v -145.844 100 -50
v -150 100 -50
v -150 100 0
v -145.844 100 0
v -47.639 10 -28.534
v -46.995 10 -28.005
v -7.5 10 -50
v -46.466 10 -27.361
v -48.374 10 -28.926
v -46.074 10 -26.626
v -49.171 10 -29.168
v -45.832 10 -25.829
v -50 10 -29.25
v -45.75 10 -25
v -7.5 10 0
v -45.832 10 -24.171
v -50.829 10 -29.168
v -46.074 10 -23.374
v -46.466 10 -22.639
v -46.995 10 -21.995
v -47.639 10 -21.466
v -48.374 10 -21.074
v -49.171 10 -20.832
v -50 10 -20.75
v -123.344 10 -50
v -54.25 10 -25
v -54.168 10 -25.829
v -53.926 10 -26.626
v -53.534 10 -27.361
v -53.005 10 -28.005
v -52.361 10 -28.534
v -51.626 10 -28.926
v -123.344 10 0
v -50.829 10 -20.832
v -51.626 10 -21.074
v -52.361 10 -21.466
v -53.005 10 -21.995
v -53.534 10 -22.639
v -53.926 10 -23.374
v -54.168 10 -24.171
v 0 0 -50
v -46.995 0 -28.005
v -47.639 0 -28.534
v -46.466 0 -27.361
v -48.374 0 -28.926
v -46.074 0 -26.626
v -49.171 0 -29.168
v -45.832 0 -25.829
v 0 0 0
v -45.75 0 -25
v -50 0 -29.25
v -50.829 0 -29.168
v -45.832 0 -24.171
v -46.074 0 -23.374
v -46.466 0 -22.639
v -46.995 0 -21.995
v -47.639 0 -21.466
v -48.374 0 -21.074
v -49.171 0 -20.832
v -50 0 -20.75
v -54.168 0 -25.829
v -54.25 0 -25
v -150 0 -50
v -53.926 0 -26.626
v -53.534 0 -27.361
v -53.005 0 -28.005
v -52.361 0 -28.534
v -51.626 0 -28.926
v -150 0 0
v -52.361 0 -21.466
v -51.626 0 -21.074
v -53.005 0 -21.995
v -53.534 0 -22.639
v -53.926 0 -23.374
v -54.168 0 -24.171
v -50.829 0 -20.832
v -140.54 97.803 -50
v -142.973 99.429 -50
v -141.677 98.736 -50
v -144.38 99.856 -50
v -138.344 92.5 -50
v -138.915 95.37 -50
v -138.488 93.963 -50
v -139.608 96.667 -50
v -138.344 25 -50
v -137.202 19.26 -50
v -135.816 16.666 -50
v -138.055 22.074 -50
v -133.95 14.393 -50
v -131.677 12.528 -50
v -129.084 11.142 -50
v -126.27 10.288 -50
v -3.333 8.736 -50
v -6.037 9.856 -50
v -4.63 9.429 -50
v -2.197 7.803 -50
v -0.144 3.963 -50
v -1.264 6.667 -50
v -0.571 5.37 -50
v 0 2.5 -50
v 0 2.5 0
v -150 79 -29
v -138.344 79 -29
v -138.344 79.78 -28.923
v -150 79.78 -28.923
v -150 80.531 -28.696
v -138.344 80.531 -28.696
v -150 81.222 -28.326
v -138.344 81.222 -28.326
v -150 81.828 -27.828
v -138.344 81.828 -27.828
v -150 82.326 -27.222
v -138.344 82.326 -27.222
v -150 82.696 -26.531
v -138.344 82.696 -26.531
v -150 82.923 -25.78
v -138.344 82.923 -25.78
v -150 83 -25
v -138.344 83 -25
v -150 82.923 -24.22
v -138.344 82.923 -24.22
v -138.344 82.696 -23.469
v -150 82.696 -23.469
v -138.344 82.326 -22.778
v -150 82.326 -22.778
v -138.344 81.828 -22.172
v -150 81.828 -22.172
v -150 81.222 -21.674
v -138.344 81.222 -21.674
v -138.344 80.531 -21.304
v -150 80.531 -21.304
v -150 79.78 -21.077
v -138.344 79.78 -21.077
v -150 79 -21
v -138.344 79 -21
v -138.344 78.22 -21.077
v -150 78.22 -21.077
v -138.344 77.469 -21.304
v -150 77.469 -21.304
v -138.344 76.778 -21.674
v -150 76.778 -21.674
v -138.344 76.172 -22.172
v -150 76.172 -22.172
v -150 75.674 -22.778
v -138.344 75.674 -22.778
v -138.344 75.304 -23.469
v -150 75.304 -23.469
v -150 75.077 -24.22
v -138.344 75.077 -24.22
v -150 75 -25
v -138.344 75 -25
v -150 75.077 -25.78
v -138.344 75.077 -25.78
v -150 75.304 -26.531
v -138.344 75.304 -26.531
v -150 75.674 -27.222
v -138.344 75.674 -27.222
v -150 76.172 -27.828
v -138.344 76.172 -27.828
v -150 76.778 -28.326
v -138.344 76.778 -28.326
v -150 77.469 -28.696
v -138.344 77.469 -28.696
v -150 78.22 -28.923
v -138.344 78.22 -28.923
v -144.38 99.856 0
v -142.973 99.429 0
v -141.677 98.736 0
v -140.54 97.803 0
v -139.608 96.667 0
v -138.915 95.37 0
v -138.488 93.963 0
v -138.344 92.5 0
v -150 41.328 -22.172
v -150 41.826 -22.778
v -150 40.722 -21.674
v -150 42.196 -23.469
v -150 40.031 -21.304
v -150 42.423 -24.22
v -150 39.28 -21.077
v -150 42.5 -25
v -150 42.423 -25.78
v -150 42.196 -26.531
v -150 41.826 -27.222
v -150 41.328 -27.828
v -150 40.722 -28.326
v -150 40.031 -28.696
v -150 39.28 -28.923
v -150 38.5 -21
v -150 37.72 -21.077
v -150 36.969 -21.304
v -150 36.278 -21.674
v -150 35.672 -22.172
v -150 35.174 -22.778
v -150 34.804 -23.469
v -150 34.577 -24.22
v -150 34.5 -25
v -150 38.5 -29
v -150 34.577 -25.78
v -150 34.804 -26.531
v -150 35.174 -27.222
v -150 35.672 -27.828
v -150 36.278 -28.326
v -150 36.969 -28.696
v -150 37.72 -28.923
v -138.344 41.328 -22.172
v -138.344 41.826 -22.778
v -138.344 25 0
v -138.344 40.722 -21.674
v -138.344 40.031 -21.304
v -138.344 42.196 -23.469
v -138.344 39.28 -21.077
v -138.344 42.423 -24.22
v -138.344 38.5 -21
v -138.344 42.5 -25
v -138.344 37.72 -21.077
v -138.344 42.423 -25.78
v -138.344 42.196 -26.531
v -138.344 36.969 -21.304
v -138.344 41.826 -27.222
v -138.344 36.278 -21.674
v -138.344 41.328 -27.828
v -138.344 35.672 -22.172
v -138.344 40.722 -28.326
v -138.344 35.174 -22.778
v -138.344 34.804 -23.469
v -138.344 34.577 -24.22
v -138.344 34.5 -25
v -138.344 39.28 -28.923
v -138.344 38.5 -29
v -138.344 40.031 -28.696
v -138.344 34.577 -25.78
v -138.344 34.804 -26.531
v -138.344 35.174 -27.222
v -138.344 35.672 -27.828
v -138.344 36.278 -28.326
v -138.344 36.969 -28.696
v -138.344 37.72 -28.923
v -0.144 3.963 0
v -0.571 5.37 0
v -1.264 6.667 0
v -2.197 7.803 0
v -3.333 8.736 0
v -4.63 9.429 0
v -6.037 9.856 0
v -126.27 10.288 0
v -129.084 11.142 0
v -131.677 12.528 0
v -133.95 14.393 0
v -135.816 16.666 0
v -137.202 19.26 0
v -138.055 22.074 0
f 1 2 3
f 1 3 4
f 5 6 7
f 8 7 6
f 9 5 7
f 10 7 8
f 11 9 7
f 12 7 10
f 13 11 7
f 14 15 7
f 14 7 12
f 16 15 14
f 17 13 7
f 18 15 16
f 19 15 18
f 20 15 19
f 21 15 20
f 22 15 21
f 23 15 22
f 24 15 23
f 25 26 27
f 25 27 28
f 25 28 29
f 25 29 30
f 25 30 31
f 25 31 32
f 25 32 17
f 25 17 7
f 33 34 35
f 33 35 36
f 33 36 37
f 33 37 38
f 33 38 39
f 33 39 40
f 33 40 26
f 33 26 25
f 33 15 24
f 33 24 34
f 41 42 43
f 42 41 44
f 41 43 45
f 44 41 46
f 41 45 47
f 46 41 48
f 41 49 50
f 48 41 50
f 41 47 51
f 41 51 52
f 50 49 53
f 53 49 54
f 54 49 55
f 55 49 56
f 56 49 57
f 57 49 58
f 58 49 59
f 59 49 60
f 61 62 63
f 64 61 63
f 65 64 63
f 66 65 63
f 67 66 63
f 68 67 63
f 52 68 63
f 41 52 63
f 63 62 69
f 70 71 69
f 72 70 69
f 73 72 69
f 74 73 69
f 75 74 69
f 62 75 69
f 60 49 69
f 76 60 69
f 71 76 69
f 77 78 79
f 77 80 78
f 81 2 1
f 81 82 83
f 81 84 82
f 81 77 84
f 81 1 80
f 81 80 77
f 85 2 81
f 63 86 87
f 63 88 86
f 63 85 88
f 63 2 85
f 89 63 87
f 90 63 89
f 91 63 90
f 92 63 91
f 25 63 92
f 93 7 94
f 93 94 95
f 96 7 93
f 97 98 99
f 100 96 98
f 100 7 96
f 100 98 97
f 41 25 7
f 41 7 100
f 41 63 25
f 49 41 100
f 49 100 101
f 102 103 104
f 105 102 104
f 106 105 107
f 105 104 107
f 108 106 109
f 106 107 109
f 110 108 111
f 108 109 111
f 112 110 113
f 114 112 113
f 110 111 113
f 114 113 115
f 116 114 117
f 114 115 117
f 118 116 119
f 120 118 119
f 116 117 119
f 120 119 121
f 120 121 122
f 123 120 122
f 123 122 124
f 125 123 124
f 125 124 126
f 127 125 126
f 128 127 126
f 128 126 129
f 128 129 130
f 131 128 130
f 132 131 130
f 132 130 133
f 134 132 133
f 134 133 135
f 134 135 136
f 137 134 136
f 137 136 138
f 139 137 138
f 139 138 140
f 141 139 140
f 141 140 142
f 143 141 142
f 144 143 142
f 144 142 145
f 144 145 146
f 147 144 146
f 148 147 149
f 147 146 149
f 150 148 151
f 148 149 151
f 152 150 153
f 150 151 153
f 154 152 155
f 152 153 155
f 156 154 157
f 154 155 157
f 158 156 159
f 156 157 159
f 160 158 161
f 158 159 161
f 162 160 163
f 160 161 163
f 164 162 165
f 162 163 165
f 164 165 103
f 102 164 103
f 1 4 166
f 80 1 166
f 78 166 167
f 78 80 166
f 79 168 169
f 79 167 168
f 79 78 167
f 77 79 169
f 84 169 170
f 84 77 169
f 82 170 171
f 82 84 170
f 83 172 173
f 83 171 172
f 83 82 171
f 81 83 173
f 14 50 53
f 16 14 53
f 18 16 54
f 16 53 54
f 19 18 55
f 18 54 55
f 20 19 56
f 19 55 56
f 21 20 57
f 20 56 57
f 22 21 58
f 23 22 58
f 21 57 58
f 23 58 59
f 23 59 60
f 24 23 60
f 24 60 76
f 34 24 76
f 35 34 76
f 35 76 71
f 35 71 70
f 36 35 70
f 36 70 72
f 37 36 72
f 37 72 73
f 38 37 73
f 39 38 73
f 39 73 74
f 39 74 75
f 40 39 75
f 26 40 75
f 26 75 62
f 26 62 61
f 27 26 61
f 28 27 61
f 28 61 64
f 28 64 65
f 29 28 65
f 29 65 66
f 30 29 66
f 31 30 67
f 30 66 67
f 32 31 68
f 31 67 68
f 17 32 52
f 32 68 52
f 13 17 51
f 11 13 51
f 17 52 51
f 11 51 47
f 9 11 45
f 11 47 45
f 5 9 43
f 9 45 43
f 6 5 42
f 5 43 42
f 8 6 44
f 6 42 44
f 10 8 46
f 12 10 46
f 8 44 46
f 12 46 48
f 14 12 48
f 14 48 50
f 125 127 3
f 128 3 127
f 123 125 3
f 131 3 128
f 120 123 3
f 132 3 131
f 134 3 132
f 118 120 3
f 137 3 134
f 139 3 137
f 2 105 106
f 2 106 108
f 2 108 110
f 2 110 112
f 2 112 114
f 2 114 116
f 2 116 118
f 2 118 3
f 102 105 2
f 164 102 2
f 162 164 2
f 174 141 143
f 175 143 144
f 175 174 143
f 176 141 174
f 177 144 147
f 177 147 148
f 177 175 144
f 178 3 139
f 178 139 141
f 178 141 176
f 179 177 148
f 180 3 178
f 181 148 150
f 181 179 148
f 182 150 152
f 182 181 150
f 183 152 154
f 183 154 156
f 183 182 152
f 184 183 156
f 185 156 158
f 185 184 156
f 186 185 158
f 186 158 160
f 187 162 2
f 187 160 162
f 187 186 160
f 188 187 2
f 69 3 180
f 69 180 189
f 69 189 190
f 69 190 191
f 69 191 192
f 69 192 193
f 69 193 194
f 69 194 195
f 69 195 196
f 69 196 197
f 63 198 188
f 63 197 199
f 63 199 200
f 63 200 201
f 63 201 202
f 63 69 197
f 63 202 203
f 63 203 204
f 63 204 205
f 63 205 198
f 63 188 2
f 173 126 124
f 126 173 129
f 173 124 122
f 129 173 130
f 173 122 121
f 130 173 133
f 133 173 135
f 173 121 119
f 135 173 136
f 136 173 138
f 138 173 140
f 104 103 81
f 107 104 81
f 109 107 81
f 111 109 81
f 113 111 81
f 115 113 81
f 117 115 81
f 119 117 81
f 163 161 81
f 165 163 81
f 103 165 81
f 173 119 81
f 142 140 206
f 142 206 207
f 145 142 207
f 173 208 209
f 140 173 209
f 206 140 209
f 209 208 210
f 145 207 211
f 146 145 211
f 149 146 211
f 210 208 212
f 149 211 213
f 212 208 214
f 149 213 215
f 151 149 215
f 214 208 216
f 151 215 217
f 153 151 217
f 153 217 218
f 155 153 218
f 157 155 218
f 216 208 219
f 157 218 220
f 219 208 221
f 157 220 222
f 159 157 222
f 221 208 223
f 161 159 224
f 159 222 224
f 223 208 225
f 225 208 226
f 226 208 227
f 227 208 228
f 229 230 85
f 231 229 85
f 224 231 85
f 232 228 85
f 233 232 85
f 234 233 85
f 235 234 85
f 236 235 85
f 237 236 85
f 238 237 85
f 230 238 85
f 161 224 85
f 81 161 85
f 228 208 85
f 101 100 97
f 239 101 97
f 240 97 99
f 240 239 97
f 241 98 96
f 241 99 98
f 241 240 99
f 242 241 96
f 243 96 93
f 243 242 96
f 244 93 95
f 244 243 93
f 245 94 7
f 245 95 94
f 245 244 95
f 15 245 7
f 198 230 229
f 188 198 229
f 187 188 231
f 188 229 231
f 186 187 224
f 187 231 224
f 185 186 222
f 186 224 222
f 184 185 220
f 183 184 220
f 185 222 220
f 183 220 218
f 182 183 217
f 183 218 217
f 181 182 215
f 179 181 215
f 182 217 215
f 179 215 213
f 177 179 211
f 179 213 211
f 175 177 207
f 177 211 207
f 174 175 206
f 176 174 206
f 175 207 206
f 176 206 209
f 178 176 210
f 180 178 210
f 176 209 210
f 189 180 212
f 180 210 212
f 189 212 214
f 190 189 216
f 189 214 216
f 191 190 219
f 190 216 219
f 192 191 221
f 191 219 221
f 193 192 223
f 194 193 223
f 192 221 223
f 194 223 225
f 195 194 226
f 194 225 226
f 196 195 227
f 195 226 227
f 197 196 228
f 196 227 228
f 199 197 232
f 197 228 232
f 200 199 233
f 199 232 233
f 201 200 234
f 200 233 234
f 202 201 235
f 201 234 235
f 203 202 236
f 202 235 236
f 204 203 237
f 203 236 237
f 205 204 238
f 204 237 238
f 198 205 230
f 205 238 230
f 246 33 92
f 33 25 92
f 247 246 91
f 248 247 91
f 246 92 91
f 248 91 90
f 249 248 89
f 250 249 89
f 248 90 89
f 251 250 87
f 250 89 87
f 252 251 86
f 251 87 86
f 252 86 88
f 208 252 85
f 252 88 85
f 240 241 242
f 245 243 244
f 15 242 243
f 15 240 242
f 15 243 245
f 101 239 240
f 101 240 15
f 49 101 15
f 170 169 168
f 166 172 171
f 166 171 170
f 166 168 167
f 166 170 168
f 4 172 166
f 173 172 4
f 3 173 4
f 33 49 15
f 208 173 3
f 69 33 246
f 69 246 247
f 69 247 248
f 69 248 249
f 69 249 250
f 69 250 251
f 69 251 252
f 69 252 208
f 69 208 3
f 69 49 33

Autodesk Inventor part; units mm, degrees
ref_plane "YZ Plane" through (0, 0, 0) normal (1, 0, 0) x (0, 1, 0)
ref_plane "XZ Plane" through (0, 0, 0) normal (0, 1, 0) x (-1, 0, 0)
ref_plane "XY Plane" through (0, 0, 0) normal (0, 0, 1) x (1, 0, 0)
sketch "Sketch1" plane through (0, 0, 0) normal (0, 1, 0) x (-1, 0, 0)
  line L0 (0, 0) -> (150, 0)
  line L1 (150, 0) -> (150, -50)
  line L2 (150, -50) -> (0, -50)
  line L3 (0, -50) -> (0, 0)
  dimension "d0" = 150
  dimension "d1" = 50
extrude "Extrusion1" add sketch "Sketch1" along normal blind 10
sketch "Sketch2" plane through (0, 10, 0) normal (0, 1, 0) x (1, 0, 0)
  line L0 (-150, 50) -> (-150, 0) projected
  line L1 (-150, 0) -> (-138.3436, 0)
  line L2 (-138.3436, 0) -> (-138.3436, 50)
  line L3 (-138.3436, 50) -> (-150, 50)
  line L4 (-150, 50) -> (-150, 0)
  point P0 (0, 0)
extrude "Extrusion2" add sketch "Sketch2" along normal blind 90
fillet "Fillet1" radius 15 1 edges at (-138.3436, 10, -25)
fillet "Fillet2" radius 7.5 2 edges at (-138.3436, 100, -25) (0, 10, -25)
sketch "Sketch3" plane through (-138.3436, 25, 0) normal (1, 0, 0) x (0, 0, -1)
  line L0 (0, 0) -> (0, 67.5) projected
  line L1 (50, 0) -> (50, 67.5) projected
  line L2 (0, 67.5) -> (50, 67.5) projected
  line L3 (0, 0) -> (0, 67.5) projected
  line L4 (50, 0) -> (0, 0) projected
  line L5 (50, 0) -> (50, 67.5) projected
  circle A0 centre (25, 54) radius 4
  circle A1 centre (25, 13.5) radius 4
  point P0 (0, -25)
  dimension "d8" = 8
  dimension "d9" = 8
  dimension "d10" = 67.5
  dimension "d11" = 50
  dimension "d12" = 25
  dimension "d13" = 13.5
  dimension "d14" = 13.5
  dimension "d17" = 40.5
extrude "Extrusion3" cut sketch "Sketch3" against normal up to next contours A0 | A1
sketch "Sketch4" plane through (0, 0, 0) normal (0, -1, 0) x (1, 0, 0)
  line L0 (-150, 0) -> (-150, -50) projected
  circle A0 centre (-50, -25) radius 4.25
  line L1 (0, 0) -> (-150, 0) projected
  dimension "d18" = 8.5
  dimension "d19" = 100
  dimension "d20" = 50
  dimension "d21" = 25
extrude "Extrusion4" cut sketch "Sketch4" against normal blind 10
equation "\"d12\" = 0.5 * d11"
equation "\"d13\" = 0.2 * d10"
equation "\"d14\" = d13"
equation "\"d21\" = 0.5 * d20"
properties part number "L_ShapedBracket_100x200x10_ozce"
